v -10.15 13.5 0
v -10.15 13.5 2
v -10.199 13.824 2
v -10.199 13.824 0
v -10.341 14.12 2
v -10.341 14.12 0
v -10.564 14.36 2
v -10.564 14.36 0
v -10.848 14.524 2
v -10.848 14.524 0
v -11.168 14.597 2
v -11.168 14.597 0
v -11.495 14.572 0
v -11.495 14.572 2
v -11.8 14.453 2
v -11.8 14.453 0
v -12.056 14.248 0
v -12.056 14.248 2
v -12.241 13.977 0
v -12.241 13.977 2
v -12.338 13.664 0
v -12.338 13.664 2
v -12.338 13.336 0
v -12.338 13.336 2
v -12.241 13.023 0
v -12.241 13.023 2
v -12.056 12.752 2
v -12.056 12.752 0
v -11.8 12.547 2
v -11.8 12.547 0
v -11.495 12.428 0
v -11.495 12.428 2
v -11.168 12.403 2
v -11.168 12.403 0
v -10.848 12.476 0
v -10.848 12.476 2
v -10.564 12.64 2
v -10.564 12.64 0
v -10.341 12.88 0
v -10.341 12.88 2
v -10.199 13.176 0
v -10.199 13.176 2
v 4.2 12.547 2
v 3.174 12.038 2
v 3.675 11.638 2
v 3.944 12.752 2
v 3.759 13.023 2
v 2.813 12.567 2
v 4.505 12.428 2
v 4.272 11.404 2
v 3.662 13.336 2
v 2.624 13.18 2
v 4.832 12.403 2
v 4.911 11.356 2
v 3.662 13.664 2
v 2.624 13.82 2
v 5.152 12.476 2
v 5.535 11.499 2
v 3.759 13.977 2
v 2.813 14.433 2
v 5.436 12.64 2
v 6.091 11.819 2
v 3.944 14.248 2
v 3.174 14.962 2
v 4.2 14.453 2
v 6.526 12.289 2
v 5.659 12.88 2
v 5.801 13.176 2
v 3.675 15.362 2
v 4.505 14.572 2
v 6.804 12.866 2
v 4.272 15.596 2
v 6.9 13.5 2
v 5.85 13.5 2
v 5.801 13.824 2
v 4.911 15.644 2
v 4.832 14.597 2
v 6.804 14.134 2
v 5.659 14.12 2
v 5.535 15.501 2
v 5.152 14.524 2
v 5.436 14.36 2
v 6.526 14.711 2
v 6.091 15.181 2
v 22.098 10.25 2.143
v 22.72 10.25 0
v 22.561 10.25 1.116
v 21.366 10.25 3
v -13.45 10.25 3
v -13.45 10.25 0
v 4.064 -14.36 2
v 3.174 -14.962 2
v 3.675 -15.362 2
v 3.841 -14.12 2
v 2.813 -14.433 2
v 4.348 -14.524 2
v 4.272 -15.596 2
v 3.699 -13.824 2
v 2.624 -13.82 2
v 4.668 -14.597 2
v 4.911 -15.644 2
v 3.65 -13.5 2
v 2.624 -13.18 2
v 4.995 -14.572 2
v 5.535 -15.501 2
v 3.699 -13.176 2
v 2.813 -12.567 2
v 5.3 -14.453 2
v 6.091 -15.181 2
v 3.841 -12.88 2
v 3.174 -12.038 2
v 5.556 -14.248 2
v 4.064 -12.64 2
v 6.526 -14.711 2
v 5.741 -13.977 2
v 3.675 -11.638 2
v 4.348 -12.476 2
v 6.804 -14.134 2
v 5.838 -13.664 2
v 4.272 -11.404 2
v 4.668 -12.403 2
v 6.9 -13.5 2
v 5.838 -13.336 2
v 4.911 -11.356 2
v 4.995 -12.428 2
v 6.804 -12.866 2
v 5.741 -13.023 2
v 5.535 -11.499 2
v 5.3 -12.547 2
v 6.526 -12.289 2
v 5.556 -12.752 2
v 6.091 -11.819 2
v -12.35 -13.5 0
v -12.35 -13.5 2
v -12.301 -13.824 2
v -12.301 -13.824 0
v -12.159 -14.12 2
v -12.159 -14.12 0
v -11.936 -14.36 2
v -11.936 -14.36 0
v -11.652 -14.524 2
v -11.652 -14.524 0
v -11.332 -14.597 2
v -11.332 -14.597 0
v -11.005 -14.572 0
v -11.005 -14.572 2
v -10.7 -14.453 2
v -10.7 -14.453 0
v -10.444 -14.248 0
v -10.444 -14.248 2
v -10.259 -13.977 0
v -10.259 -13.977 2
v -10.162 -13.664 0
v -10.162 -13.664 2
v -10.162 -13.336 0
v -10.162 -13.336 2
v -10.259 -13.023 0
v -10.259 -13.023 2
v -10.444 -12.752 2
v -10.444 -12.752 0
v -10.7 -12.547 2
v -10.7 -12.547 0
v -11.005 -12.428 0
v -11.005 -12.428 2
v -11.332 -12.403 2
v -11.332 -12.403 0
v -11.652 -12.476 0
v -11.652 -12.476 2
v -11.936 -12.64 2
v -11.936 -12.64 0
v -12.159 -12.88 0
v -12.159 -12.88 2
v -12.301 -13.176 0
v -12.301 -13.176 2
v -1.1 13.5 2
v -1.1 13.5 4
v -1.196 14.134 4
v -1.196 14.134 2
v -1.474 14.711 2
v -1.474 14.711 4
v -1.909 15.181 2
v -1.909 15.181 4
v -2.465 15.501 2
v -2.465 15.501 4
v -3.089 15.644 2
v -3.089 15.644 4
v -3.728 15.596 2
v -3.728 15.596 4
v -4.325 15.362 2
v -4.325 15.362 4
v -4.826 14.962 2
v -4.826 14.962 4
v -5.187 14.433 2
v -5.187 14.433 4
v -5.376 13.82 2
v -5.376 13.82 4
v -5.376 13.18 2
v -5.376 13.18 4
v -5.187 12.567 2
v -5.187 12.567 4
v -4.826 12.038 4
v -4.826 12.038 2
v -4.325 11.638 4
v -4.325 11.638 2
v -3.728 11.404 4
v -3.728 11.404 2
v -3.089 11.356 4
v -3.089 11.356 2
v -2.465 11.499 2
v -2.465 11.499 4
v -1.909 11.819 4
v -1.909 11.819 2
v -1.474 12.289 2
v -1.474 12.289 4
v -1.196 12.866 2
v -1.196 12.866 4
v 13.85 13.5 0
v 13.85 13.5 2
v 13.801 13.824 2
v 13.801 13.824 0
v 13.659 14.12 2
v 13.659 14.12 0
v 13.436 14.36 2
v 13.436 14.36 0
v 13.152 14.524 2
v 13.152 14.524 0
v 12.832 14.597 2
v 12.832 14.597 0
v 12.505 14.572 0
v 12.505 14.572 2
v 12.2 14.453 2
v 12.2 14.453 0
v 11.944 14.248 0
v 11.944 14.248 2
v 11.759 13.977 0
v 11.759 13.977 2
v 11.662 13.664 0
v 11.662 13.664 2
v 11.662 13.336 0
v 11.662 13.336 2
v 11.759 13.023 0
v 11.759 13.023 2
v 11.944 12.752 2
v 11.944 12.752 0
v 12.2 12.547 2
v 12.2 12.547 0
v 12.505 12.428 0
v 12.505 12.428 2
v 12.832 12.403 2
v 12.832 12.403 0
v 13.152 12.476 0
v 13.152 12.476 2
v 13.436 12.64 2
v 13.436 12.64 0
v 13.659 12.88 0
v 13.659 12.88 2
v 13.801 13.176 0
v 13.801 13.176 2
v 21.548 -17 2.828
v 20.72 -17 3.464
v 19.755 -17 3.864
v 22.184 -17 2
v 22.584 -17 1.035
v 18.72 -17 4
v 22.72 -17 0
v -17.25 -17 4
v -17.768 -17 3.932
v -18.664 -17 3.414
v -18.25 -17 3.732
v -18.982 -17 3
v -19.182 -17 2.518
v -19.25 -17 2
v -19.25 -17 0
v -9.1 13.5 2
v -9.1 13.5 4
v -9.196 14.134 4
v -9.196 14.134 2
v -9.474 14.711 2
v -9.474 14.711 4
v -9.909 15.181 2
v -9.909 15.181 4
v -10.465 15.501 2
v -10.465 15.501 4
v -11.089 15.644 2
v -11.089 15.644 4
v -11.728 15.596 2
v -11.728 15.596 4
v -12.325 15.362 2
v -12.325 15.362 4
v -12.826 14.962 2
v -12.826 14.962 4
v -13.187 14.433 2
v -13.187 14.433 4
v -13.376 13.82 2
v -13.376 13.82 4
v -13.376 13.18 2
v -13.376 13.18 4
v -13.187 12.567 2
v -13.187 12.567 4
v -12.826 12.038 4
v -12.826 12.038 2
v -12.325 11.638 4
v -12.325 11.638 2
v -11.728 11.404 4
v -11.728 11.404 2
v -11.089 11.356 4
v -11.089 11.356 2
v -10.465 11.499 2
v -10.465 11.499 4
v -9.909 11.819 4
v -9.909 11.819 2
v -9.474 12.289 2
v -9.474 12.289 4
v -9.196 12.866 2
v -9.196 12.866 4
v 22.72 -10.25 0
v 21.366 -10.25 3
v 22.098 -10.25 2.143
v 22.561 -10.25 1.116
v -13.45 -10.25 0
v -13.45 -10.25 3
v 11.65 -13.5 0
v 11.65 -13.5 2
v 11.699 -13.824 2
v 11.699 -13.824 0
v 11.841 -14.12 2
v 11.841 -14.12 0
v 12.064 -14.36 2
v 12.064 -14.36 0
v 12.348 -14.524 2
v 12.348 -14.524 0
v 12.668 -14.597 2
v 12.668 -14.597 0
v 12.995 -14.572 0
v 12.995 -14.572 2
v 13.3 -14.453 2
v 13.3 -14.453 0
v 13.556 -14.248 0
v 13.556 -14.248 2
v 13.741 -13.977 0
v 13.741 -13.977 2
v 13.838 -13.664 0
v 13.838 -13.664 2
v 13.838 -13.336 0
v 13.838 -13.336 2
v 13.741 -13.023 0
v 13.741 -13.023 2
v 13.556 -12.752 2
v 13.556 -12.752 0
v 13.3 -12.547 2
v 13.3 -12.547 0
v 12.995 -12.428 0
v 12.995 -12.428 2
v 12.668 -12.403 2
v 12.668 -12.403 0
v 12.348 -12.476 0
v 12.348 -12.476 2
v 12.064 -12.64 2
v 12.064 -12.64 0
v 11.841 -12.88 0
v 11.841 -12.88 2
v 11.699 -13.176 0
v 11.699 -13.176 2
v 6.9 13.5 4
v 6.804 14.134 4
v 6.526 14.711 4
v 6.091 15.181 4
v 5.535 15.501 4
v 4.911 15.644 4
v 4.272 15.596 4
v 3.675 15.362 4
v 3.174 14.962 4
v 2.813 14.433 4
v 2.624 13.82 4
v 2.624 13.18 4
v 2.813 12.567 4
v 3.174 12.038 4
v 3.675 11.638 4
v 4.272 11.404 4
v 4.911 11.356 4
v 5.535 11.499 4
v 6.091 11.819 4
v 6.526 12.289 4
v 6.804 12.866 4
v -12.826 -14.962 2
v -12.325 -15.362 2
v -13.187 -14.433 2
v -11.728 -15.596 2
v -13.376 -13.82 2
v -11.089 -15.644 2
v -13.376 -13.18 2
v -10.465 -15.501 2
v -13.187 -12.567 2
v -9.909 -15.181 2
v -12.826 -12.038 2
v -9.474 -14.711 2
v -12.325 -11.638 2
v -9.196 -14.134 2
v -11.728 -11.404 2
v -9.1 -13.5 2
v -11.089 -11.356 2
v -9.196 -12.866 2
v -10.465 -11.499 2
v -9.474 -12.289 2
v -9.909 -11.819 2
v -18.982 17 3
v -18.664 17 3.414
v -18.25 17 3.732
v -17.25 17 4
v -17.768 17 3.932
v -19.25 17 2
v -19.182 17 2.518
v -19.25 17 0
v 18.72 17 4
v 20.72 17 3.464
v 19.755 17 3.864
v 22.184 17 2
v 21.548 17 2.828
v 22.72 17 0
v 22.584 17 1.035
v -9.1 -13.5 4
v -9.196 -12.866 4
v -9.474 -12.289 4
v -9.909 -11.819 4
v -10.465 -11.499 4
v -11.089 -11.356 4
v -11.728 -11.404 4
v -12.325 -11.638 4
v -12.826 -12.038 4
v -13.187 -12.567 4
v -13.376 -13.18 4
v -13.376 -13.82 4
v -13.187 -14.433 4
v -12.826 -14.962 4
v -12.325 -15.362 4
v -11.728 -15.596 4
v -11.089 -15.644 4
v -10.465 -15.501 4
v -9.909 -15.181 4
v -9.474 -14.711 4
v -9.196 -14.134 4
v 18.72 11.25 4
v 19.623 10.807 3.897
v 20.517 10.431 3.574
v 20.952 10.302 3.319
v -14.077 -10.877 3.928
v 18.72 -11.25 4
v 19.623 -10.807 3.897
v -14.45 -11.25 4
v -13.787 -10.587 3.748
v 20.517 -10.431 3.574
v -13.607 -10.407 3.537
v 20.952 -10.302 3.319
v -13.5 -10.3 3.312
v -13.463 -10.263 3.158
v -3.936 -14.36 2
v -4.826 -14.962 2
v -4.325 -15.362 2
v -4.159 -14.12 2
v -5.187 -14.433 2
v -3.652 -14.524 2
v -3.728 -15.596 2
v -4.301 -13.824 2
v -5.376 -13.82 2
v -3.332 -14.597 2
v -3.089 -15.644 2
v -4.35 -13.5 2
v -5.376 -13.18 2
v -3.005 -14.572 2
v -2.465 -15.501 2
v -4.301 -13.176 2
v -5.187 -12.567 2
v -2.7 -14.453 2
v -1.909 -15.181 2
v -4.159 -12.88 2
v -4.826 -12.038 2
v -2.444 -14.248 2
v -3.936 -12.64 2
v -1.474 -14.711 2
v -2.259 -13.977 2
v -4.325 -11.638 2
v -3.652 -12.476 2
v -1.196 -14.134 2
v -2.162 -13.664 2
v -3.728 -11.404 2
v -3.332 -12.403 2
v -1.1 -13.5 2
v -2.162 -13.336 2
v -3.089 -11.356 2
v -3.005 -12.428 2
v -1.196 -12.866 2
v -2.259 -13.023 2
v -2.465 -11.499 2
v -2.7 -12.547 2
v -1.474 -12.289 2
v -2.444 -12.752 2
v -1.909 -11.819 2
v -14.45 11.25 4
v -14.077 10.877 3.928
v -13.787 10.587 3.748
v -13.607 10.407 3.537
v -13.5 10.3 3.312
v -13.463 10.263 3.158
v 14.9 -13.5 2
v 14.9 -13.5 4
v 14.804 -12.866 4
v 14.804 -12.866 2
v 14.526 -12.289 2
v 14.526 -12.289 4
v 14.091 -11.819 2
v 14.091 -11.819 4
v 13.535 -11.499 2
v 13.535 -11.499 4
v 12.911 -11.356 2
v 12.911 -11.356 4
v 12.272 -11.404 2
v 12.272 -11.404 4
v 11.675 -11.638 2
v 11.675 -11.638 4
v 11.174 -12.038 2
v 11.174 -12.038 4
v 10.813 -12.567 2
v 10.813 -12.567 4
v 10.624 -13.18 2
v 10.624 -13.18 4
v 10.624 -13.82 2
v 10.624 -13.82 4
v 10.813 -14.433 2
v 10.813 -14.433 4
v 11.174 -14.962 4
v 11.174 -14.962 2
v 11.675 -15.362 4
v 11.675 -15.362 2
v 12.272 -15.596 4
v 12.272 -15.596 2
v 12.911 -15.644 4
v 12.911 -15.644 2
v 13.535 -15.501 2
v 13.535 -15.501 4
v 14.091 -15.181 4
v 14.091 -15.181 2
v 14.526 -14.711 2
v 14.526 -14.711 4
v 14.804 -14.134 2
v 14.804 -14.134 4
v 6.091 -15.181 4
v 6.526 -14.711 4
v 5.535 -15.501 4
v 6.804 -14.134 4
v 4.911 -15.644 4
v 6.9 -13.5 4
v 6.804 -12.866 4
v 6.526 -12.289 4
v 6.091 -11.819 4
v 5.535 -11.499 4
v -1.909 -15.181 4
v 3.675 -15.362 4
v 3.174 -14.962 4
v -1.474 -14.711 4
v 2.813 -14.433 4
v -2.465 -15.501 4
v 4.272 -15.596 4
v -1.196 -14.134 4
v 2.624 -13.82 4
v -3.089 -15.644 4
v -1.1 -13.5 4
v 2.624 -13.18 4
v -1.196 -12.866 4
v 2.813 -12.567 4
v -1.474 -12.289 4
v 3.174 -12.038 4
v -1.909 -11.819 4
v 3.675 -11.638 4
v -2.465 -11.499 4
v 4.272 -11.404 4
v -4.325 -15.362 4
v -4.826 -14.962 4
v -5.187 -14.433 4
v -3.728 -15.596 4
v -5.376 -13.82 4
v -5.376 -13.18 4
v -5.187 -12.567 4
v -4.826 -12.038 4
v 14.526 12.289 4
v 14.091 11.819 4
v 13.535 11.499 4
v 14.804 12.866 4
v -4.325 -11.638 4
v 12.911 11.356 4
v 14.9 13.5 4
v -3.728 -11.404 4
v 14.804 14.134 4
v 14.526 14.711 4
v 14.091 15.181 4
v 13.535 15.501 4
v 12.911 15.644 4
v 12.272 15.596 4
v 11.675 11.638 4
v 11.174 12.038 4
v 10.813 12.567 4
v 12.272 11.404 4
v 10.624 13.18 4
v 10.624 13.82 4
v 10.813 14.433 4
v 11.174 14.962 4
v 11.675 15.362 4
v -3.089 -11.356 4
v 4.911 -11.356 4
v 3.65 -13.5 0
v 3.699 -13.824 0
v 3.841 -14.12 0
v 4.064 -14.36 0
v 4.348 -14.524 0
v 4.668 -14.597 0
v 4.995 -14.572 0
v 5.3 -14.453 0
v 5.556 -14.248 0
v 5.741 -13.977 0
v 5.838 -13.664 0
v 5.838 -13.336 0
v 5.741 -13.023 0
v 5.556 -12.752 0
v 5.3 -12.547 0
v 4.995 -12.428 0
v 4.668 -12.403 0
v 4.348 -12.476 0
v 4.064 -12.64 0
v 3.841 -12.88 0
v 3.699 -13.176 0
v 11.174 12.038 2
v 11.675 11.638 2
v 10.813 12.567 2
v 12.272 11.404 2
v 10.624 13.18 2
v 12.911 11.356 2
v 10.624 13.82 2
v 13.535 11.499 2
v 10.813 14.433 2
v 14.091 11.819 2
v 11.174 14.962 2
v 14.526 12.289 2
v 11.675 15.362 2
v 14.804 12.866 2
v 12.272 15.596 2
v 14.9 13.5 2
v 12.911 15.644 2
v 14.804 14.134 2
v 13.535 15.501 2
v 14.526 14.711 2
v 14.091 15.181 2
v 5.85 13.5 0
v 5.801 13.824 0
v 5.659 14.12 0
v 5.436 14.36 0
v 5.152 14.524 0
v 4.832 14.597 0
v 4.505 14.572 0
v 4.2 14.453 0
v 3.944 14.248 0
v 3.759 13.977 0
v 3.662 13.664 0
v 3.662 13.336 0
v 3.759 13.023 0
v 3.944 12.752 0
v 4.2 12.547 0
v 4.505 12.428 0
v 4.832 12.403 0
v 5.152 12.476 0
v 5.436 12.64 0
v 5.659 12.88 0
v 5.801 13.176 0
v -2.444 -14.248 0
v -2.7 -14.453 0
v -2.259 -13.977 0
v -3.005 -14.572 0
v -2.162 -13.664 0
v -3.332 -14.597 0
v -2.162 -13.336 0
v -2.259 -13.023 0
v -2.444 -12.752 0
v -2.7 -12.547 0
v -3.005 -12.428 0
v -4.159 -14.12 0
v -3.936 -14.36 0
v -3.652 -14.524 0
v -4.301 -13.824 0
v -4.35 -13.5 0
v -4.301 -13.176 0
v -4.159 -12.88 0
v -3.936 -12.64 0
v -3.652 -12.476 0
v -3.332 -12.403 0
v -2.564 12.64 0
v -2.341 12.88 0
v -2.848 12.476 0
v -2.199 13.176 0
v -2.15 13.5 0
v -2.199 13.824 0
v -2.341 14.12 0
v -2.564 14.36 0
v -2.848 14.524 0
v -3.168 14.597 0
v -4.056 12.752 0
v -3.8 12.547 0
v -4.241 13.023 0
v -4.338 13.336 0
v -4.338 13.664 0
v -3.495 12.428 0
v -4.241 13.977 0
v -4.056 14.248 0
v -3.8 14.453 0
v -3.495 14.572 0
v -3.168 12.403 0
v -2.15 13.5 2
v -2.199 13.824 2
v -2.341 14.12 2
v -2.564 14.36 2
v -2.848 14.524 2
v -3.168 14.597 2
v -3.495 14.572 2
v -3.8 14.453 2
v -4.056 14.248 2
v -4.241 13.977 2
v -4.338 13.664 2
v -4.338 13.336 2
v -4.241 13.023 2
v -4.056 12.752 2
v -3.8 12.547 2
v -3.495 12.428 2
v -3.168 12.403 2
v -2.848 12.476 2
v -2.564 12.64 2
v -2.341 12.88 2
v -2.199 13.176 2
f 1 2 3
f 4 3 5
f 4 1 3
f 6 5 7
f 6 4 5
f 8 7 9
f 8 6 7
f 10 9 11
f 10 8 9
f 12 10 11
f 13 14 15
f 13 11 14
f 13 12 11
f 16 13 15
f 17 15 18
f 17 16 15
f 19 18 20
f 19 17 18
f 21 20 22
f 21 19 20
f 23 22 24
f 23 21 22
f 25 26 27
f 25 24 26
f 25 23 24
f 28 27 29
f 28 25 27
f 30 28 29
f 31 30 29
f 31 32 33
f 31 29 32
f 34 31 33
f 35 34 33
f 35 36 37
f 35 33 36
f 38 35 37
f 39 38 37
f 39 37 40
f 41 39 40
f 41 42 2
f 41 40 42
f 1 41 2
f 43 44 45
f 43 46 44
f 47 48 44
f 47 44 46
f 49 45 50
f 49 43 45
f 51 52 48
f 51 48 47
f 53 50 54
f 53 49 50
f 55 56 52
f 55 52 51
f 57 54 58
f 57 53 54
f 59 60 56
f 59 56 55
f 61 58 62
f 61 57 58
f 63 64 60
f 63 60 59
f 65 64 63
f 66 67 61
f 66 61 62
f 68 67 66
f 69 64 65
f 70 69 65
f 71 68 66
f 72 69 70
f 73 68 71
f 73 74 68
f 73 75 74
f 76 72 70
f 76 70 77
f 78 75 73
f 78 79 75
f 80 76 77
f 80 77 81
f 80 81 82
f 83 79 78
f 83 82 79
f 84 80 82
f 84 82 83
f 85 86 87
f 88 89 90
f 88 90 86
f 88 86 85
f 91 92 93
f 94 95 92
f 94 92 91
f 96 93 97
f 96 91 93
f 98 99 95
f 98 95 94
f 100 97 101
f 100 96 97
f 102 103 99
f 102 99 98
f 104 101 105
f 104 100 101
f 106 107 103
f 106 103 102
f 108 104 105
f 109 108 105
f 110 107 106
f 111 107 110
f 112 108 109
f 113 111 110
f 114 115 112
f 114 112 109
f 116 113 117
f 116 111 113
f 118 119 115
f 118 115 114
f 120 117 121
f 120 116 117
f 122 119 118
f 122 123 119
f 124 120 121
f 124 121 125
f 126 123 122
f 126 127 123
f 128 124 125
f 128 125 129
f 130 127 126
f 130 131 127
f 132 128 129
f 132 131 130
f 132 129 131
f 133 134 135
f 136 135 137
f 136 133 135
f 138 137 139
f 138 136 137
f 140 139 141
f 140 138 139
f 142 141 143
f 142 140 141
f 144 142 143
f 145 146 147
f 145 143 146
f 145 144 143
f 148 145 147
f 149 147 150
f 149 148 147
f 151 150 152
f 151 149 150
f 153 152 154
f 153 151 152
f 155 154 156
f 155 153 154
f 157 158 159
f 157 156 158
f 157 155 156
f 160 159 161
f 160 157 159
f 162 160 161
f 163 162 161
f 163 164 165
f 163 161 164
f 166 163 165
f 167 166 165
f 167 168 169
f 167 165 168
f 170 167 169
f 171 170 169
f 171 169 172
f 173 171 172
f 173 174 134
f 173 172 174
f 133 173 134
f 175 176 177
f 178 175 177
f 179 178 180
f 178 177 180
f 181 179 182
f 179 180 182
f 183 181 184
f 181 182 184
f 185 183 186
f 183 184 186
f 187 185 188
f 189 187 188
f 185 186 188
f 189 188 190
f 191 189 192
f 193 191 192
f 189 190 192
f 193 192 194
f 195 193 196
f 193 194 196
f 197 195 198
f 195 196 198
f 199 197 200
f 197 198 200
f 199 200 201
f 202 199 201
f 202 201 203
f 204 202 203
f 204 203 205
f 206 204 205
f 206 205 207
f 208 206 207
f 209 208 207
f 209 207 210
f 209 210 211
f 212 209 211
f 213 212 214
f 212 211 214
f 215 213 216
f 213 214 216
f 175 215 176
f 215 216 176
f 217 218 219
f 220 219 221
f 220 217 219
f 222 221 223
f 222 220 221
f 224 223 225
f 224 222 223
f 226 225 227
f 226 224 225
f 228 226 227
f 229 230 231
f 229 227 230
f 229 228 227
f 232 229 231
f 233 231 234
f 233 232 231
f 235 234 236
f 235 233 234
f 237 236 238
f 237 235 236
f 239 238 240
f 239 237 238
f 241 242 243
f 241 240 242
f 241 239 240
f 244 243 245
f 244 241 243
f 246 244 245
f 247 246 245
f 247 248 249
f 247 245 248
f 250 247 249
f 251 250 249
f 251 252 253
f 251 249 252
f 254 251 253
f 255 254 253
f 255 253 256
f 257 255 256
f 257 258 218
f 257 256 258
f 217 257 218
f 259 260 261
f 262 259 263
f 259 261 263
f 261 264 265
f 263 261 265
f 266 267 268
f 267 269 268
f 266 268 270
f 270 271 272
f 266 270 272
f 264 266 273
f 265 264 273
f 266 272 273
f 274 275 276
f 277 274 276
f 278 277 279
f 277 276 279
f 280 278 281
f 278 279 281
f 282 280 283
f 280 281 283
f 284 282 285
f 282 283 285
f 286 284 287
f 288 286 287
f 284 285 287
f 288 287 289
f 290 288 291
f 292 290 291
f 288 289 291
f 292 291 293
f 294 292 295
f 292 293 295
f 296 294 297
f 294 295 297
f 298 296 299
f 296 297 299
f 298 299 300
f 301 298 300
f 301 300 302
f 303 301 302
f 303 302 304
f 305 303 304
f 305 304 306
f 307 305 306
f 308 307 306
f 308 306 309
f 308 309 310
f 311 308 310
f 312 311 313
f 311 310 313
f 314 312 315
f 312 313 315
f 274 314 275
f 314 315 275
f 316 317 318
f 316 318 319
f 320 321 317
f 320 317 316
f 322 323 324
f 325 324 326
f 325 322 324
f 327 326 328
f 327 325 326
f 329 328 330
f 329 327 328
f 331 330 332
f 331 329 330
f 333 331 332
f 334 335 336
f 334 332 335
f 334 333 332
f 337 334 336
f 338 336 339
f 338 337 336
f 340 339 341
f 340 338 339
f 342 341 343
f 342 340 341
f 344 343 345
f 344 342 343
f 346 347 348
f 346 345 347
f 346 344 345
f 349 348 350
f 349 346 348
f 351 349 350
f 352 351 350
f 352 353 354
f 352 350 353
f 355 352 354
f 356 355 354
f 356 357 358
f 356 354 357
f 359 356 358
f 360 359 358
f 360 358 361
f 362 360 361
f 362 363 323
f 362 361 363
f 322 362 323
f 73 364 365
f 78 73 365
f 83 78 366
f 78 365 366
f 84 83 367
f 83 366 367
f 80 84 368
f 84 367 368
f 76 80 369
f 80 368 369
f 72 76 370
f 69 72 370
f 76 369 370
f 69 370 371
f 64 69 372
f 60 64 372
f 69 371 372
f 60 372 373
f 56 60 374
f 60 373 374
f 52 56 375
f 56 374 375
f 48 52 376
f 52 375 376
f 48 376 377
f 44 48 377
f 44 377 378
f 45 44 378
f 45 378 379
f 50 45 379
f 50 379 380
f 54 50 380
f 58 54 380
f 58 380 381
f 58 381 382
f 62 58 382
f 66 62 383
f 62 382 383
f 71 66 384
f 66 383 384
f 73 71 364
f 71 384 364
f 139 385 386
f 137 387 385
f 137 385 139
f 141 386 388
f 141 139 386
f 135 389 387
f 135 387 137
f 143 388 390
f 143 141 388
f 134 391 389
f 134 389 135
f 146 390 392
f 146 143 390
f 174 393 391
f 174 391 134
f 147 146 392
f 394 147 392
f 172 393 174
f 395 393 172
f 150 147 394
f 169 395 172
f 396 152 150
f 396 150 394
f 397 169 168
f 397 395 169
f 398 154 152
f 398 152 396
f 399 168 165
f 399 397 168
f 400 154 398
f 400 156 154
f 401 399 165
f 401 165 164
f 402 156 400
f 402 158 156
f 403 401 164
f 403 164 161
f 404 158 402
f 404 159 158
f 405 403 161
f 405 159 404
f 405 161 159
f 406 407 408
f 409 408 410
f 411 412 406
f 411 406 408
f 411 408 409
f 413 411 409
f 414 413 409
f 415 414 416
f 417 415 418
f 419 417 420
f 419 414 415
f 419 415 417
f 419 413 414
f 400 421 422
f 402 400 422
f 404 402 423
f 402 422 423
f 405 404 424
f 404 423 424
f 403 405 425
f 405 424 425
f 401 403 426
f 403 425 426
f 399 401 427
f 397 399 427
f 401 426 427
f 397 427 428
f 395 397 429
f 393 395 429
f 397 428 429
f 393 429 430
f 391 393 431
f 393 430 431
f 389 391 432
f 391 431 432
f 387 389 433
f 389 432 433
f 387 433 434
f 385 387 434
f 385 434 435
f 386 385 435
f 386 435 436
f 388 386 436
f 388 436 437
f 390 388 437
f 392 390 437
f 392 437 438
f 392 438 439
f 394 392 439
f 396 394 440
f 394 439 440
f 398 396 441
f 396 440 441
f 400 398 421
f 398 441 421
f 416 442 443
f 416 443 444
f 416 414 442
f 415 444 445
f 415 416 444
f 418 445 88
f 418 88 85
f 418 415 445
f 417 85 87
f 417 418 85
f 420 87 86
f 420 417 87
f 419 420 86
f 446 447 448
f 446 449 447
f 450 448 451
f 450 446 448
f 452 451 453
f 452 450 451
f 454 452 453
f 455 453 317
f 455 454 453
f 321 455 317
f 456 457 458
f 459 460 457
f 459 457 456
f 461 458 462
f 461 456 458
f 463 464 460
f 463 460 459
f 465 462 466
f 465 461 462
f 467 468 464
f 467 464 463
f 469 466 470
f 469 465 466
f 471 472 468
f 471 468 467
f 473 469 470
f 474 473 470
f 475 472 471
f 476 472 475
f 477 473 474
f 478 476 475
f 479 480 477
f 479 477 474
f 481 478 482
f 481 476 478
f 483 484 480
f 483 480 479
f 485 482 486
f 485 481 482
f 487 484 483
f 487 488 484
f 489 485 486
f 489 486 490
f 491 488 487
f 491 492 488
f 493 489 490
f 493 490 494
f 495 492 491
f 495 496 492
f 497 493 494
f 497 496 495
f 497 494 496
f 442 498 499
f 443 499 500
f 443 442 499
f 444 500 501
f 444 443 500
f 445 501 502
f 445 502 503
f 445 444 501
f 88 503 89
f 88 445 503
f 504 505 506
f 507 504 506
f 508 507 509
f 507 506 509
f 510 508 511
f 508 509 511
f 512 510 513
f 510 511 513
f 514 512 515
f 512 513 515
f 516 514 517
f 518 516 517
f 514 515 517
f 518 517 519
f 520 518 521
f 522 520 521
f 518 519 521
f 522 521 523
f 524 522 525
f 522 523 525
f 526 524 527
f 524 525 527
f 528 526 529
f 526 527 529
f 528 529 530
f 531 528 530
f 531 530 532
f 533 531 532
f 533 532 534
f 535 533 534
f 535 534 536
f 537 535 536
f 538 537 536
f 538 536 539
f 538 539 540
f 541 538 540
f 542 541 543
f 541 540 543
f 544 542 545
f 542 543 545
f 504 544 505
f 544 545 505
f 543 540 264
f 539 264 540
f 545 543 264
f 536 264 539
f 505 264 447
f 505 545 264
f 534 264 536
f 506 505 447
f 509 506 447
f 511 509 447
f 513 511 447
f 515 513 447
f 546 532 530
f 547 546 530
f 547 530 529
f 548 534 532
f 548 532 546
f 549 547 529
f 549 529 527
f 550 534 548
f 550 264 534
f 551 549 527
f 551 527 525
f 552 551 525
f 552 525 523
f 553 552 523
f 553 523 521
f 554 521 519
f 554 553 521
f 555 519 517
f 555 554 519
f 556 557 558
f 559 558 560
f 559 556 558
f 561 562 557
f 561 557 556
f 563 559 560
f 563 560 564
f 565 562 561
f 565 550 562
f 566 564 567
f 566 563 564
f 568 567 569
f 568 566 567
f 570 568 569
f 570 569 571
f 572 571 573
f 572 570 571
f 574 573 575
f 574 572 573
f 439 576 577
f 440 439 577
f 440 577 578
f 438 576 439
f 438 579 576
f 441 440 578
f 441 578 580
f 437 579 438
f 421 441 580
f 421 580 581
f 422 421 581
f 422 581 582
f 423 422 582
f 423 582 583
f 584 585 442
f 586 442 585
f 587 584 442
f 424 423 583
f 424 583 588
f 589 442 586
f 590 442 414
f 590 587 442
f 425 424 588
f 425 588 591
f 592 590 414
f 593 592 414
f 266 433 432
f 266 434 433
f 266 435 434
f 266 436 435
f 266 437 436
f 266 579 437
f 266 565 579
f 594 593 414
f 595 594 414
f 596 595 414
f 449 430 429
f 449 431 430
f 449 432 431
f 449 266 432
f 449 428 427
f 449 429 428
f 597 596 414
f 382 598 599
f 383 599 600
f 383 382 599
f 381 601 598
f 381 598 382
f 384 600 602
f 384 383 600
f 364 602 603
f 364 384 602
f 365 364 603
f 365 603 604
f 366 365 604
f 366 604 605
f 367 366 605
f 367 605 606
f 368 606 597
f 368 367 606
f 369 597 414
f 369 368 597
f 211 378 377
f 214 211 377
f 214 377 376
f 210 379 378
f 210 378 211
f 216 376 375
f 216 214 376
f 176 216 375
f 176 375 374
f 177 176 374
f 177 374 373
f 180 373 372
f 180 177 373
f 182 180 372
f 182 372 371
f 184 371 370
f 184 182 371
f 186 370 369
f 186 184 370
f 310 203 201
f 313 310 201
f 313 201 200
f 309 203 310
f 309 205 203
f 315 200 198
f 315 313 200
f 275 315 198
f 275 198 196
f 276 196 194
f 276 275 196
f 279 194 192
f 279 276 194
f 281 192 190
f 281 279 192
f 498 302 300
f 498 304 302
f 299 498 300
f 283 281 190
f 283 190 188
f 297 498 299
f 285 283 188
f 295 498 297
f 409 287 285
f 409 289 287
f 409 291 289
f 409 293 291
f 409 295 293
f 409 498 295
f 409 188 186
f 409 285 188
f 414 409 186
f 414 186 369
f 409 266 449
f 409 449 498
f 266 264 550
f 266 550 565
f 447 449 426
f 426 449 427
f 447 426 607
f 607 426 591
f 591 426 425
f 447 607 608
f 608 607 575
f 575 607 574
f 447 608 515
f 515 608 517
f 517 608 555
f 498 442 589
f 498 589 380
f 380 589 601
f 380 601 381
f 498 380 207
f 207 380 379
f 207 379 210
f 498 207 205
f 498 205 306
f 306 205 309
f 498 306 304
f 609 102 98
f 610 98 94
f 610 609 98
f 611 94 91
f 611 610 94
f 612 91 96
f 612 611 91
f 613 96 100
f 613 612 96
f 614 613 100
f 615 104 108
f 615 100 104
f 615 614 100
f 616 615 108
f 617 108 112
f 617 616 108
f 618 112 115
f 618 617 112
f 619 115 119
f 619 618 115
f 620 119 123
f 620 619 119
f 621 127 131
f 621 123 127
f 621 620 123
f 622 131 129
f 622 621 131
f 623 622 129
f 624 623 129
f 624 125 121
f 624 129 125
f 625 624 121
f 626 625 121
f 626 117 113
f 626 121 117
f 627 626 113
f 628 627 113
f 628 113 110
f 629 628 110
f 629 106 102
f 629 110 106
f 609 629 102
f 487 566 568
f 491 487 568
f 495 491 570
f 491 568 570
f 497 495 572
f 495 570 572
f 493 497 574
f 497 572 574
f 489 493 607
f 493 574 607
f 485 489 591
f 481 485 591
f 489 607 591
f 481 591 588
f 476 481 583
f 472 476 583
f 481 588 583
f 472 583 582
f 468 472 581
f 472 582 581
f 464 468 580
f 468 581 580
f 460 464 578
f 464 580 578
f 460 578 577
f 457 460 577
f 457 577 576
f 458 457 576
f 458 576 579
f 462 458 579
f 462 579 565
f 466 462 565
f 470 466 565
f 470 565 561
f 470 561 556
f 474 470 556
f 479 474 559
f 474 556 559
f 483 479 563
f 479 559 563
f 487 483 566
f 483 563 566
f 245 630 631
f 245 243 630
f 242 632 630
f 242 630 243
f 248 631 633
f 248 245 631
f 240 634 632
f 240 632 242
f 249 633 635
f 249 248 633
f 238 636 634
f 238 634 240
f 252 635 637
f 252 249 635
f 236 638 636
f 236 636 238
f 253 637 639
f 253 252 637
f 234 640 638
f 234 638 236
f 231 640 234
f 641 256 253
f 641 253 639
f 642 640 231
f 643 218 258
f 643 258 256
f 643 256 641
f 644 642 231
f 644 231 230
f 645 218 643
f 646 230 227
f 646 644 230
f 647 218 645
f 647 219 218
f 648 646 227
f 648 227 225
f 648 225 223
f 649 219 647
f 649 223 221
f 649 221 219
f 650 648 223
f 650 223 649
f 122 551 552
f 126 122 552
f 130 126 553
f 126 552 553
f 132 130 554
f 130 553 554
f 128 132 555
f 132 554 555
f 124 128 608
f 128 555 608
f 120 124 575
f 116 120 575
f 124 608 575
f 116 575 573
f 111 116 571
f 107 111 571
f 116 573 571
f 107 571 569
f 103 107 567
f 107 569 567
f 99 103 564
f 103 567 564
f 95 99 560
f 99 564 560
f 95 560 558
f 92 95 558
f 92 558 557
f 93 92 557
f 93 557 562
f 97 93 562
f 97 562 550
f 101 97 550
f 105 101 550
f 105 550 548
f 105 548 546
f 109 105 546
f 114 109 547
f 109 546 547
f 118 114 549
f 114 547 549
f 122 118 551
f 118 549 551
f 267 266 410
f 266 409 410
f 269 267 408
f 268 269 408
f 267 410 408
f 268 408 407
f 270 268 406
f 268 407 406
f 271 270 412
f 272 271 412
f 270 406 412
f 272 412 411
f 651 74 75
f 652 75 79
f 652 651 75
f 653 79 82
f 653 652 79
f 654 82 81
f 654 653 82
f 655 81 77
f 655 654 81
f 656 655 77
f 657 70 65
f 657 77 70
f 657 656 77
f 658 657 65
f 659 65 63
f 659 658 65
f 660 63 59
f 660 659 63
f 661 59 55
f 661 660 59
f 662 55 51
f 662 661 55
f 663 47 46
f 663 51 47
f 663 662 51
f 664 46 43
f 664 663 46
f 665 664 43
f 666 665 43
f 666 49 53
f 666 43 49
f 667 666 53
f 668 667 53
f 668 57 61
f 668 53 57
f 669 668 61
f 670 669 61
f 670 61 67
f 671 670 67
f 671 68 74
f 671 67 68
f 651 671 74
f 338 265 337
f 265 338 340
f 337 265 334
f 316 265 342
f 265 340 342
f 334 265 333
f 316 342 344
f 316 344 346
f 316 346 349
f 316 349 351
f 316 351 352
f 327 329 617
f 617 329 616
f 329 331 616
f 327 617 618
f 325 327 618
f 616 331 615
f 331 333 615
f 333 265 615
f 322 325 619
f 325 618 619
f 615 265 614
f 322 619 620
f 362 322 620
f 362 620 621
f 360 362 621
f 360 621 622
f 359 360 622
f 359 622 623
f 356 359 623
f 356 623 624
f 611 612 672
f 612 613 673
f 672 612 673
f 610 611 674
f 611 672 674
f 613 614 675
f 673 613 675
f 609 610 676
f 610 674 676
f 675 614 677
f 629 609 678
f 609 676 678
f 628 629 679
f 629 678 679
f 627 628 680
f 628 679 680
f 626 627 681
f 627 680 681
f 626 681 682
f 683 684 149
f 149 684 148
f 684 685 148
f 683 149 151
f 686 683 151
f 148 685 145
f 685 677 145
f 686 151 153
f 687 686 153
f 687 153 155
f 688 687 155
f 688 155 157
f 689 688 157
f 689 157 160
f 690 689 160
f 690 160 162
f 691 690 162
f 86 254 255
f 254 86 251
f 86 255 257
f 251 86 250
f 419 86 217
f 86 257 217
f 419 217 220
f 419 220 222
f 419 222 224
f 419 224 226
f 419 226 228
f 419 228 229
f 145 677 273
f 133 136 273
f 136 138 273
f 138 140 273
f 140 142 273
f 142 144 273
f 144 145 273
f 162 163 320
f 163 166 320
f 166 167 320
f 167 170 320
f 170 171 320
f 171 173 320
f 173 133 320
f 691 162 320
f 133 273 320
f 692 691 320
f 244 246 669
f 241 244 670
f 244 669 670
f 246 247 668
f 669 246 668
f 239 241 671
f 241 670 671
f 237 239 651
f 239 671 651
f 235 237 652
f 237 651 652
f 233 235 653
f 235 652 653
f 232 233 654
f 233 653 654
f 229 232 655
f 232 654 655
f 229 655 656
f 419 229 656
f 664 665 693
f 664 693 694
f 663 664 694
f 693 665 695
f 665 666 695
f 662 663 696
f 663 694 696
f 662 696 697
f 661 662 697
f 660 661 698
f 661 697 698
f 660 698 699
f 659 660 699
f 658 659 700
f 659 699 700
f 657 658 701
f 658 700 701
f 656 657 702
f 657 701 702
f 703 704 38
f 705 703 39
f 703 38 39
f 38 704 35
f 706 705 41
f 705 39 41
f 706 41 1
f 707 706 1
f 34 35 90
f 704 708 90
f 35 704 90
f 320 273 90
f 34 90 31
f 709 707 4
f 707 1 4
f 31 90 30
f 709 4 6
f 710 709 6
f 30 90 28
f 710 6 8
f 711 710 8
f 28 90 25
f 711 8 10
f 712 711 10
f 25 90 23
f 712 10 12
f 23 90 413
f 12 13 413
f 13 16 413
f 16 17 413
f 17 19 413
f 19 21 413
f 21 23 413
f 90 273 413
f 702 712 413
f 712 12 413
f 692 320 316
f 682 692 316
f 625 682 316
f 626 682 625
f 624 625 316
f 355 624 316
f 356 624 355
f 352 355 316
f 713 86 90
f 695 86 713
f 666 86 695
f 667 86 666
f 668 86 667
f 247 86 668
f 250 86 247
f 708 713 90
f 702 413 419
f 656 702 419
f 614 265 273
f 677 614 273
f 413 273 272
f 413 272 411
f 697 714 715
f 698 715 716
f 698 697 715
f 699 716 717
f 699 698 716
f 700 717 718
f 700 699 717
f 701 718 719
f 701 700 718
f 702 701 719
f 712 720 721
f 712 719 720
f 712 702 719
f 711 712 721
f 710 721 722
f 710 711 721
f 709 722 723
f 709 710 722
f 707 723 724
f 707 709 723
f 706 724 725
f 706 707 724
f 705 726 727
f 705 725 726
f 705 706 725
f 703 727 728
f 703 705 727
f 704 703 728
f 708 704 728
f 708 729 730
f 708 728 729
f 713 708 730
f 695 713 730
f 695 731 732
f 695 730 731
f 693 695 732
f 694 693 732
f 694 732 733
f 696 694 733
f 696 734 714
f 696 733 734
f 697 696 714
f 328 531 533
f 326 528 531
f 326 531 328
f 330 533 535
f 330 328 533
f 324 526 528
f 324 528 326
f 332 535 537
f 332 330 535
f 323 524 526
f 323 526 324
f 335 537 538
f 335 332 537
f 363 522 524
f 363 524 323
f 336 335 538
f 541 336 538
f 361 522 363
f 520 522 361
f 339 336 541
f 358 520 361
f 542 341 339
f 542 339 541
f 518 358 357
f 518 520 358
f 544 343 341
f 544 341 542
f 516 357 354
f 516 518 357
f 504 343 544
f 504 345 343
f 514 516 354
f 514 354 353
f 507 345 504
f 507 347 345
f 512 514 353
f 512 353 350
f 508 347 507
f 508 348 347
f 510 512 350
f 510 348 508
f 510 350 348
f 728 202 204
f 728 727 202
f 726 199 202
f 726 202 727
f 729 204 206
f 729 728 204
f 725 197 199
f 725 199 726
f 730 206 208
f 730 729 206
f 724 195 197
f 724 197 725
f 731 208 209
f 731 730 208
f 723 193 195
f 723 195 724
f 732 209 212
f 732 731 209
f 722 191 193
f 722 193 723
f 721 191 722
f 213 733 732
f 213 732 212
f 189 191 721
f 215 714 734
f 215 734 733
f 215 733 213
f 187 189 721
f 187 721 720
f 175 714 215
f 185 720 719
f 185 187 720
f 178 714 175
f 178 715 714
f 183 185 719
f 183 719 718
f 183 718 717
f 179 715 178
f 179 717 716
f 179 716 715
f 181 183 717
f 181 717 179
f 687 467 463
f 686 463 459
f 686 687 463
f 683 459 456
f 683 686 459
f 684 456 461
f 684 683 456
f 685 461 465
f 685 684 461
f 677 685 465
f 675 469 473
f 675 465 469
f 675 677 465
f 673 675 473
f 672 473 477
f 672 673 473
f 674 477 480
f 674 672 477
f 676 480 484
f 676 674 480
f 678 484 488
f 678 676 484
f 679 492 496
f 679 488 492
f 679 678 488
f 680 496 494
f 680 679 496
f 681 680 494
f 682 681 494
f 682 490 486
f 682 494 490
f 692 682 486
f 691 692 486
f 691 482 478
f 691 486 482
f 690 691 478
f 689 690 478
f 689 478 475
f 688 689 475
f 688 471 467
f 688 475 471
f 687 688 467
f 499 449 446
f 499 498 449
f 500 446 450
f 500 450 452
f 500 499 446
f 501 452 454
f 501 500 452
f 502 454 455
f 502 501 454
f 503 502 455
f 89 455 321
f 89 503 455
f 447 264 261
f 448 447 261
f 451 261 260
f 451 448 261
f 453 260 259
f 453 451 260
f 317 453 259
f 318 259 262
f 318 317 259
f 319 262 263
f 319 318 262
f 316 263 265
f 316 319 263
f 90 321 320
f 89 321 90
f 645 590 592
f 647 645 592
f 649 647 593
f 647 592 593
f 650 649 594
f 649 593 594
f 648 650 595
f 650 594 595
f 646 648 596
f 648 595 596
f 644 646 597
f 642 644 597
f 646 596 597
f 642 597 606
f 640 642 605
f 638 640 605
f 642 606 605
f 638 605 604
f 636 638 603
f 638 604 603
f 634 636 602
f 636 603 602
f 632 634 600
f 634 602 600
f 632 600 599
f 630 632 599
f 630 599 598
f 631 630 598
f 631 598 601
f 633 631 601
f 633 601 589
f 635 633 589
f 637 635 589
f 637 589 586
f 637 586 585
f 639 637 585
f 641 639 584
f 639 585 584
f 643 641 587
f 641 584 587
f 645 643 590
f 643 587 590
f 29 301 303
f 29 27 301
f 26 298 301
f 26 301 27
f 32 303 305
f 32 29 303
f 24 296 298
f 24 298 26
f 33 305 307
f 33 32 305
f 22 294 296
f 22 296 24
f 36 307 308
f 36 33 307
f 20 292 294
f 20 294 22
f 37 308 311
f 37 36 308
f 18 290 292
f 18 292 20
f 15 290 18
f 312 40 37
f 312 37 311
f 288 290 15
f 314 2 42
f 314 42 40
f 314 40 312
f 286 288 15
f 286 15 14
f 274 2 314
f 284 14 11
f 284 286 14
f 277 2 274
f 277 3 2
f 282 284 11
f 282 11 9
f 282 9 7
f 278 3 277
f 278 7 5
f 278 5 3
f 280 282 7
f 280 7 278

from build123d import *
from OCP.BRepFilletAPI import BRepFilletAPI_MakeFillet

# Parameters (mm, degrees)
SKETCH1_R           = 1.1
BOSS_EXTRUDE1_DEPTH = 4
SKETCH2_W           = 32.7
SKETCH2_H           = 20.5
CUT_EXTRUDE1_DEPTH  = 26.991585177
SKETCH3_R           = 2.15
CUT_EXTRUDE2_DEPTH  = 2
SKETCH6_W           = 4
SKETCH6_H           = 6.75
BOSS_EXTRUDE3_DEPTH = 3.47
FILLET1_R           = 4
FILLET1_R_2         = 2
FILLET1_R_3         = 1


with BuildPart() as part:
    # Sketch1 → Boss-Extrude1 (new body)
    with BuildSketch(Plane.XY):
        with BuildLine():
            Line((19.25, 17), (19.25, 5.6))
            ThreePointArc((19.25, 5.6), (13.65, 0), (19.25, -5.6))
            Line((19.25, -5.6), (19.25, -17))
            Line((19.25, -17), (-19.25, -17))
            Line((-19.25, -17), (-19.25, 17))
            Line((-19.25, 17), (19.25, 17))
        make_face()
        with Locations((12.75, 13.5)):
            Circle(SKETCH1_R, mode=Mode.SUBTRACT)
        with Locations((4.75, 13.5)):
            Circle(SKETCH1_R, mode=Mode.SUBTRACT)
        with Locations((-3.25, 13.5)):
            Circle(SKETCH1_R, mode=Mode.SUBTRACT)
        with Locations((-11.25, 13.5)):
            Circle(SKETCH1_R, mode=Mode.SUBTRACT)
        with Locations(Location((-11.25, -13.5, 0), (0, 0, 180))):
            Circle(SKETCH1_R, mode=Mode.SUBTRACT)
        with Locations(Location((-3.25, -13.5, 0), (0, 0, 180))):
            Circle(SKETCH1_R, mode=Mode.SUBTRACT)
        with Locations(Location((4.75, -13.5, 0), (0, 0, 180))):
            Circle(SKETCH1_R, mode=Mode.SUBTRACT)
        with Locations(Location((12.75, -13.5, 0), (0, 0, 180))):
            Circle(SKETCH1_R, mode=Mode.SUBTRACT)
    extrude(amount=BOSS_EXTRUDE1_DEPTH)

    # Sketch2 → Cut-Extrude1 (cut, through all)
    with BuildSketch(Plane.XY.offset(4)):
        with Locations((2.9, 0)):
            Rectangle(SKETCH2_W, SKETCH2_H)
    extrude(amount=-CUT_EXTRUDE1_DEPTH, mode=Mode.SUBTRACT)

    # Sketch3 → Cut-Extrude2 (cut)
    with BuildSketch(Plane.XY.offset(4)):
        with Locations((12.75, 13.5)):
            Circle(SKETCH3_R)
        with Locations((4.75, 13.5)):
            Circle(SKETCH3_R)
        with Locations((-3.25, 13.5)):
            Circle(SKETCH3_R)
        with Locations((-11.25, 13.5)):
            Circle(SKETCH3_R)
        with Locations((12.75, -13.5)):
            Circle(SKETCH3_R)
        with Locations((4.75, -13.5)):
            Circle(SKETCH3_R)
        with Locations((-3.25, -13.5)):
            Circle(SKETCH3_R)
        with Locations((-11.25, -13.5)):
            Circle(SKETCH3_R)
    extrude(amount=-CUT_EXTRUDE2_DEPTH, mode=Mode.SUBTRACT)

    # Sketch6 → Boss-Extrude3 (add)
    with BuildSketch(Plane(origin=(19.25, 0, 0), x_dir=(0, 0, -1), z_dir=(1, 0, 0))):
        with Locations((-2, -13.625)):
            Rectangle(SKETCH6_W, SKETCH6_H)
        with Locations((-2, 13.625)):
            Rectangle(SKETCH6_W, SKETCH6_H)
    extrude(amount=BOSS_EXTRUDE3_DEPTH)

    # Fillet1
    fillet1_edges_1 = [part.edges().sort_by_distance(p)[0] for p in [
        (22.72, 13.625, 4),
        (22.72, -13.625, 4),
    ]]
    fillet1_edges_2 = [part.edges().sort_by_distance(p)[0] for p in [
        (-19.25, 0, 4),
    ]]
    fillet1_edges_3 = [part.edges().sort_by_distance(p)[0] for p in [
        (4.635, 10.25, 4),
        (4.635, -10.25, 4),
        (-13.45, 0, 4),
    ]]
    fillet1 = BRepFilletAPI_MakeFillet(part.part.solid().wrapped)
    for e in fillet1_edges_1:
        fillet1.Add(FILLET1_R - 0.0001, e.wrapped)
    for e in fillet1_edges_2:
        fillet1.Add(FILLET1_R_2 - 0.0001, e.wrapped)
    for e in fillet1_edges_3:
        fillet1.Add(FILLET1_R_3 - 0.0001, e.wrapped)
    add(Compound.cast(fillet1.Shape()), mode=Mode.REPLACE)  # a hair under: the kernel refuses the full size


solid = part.part
